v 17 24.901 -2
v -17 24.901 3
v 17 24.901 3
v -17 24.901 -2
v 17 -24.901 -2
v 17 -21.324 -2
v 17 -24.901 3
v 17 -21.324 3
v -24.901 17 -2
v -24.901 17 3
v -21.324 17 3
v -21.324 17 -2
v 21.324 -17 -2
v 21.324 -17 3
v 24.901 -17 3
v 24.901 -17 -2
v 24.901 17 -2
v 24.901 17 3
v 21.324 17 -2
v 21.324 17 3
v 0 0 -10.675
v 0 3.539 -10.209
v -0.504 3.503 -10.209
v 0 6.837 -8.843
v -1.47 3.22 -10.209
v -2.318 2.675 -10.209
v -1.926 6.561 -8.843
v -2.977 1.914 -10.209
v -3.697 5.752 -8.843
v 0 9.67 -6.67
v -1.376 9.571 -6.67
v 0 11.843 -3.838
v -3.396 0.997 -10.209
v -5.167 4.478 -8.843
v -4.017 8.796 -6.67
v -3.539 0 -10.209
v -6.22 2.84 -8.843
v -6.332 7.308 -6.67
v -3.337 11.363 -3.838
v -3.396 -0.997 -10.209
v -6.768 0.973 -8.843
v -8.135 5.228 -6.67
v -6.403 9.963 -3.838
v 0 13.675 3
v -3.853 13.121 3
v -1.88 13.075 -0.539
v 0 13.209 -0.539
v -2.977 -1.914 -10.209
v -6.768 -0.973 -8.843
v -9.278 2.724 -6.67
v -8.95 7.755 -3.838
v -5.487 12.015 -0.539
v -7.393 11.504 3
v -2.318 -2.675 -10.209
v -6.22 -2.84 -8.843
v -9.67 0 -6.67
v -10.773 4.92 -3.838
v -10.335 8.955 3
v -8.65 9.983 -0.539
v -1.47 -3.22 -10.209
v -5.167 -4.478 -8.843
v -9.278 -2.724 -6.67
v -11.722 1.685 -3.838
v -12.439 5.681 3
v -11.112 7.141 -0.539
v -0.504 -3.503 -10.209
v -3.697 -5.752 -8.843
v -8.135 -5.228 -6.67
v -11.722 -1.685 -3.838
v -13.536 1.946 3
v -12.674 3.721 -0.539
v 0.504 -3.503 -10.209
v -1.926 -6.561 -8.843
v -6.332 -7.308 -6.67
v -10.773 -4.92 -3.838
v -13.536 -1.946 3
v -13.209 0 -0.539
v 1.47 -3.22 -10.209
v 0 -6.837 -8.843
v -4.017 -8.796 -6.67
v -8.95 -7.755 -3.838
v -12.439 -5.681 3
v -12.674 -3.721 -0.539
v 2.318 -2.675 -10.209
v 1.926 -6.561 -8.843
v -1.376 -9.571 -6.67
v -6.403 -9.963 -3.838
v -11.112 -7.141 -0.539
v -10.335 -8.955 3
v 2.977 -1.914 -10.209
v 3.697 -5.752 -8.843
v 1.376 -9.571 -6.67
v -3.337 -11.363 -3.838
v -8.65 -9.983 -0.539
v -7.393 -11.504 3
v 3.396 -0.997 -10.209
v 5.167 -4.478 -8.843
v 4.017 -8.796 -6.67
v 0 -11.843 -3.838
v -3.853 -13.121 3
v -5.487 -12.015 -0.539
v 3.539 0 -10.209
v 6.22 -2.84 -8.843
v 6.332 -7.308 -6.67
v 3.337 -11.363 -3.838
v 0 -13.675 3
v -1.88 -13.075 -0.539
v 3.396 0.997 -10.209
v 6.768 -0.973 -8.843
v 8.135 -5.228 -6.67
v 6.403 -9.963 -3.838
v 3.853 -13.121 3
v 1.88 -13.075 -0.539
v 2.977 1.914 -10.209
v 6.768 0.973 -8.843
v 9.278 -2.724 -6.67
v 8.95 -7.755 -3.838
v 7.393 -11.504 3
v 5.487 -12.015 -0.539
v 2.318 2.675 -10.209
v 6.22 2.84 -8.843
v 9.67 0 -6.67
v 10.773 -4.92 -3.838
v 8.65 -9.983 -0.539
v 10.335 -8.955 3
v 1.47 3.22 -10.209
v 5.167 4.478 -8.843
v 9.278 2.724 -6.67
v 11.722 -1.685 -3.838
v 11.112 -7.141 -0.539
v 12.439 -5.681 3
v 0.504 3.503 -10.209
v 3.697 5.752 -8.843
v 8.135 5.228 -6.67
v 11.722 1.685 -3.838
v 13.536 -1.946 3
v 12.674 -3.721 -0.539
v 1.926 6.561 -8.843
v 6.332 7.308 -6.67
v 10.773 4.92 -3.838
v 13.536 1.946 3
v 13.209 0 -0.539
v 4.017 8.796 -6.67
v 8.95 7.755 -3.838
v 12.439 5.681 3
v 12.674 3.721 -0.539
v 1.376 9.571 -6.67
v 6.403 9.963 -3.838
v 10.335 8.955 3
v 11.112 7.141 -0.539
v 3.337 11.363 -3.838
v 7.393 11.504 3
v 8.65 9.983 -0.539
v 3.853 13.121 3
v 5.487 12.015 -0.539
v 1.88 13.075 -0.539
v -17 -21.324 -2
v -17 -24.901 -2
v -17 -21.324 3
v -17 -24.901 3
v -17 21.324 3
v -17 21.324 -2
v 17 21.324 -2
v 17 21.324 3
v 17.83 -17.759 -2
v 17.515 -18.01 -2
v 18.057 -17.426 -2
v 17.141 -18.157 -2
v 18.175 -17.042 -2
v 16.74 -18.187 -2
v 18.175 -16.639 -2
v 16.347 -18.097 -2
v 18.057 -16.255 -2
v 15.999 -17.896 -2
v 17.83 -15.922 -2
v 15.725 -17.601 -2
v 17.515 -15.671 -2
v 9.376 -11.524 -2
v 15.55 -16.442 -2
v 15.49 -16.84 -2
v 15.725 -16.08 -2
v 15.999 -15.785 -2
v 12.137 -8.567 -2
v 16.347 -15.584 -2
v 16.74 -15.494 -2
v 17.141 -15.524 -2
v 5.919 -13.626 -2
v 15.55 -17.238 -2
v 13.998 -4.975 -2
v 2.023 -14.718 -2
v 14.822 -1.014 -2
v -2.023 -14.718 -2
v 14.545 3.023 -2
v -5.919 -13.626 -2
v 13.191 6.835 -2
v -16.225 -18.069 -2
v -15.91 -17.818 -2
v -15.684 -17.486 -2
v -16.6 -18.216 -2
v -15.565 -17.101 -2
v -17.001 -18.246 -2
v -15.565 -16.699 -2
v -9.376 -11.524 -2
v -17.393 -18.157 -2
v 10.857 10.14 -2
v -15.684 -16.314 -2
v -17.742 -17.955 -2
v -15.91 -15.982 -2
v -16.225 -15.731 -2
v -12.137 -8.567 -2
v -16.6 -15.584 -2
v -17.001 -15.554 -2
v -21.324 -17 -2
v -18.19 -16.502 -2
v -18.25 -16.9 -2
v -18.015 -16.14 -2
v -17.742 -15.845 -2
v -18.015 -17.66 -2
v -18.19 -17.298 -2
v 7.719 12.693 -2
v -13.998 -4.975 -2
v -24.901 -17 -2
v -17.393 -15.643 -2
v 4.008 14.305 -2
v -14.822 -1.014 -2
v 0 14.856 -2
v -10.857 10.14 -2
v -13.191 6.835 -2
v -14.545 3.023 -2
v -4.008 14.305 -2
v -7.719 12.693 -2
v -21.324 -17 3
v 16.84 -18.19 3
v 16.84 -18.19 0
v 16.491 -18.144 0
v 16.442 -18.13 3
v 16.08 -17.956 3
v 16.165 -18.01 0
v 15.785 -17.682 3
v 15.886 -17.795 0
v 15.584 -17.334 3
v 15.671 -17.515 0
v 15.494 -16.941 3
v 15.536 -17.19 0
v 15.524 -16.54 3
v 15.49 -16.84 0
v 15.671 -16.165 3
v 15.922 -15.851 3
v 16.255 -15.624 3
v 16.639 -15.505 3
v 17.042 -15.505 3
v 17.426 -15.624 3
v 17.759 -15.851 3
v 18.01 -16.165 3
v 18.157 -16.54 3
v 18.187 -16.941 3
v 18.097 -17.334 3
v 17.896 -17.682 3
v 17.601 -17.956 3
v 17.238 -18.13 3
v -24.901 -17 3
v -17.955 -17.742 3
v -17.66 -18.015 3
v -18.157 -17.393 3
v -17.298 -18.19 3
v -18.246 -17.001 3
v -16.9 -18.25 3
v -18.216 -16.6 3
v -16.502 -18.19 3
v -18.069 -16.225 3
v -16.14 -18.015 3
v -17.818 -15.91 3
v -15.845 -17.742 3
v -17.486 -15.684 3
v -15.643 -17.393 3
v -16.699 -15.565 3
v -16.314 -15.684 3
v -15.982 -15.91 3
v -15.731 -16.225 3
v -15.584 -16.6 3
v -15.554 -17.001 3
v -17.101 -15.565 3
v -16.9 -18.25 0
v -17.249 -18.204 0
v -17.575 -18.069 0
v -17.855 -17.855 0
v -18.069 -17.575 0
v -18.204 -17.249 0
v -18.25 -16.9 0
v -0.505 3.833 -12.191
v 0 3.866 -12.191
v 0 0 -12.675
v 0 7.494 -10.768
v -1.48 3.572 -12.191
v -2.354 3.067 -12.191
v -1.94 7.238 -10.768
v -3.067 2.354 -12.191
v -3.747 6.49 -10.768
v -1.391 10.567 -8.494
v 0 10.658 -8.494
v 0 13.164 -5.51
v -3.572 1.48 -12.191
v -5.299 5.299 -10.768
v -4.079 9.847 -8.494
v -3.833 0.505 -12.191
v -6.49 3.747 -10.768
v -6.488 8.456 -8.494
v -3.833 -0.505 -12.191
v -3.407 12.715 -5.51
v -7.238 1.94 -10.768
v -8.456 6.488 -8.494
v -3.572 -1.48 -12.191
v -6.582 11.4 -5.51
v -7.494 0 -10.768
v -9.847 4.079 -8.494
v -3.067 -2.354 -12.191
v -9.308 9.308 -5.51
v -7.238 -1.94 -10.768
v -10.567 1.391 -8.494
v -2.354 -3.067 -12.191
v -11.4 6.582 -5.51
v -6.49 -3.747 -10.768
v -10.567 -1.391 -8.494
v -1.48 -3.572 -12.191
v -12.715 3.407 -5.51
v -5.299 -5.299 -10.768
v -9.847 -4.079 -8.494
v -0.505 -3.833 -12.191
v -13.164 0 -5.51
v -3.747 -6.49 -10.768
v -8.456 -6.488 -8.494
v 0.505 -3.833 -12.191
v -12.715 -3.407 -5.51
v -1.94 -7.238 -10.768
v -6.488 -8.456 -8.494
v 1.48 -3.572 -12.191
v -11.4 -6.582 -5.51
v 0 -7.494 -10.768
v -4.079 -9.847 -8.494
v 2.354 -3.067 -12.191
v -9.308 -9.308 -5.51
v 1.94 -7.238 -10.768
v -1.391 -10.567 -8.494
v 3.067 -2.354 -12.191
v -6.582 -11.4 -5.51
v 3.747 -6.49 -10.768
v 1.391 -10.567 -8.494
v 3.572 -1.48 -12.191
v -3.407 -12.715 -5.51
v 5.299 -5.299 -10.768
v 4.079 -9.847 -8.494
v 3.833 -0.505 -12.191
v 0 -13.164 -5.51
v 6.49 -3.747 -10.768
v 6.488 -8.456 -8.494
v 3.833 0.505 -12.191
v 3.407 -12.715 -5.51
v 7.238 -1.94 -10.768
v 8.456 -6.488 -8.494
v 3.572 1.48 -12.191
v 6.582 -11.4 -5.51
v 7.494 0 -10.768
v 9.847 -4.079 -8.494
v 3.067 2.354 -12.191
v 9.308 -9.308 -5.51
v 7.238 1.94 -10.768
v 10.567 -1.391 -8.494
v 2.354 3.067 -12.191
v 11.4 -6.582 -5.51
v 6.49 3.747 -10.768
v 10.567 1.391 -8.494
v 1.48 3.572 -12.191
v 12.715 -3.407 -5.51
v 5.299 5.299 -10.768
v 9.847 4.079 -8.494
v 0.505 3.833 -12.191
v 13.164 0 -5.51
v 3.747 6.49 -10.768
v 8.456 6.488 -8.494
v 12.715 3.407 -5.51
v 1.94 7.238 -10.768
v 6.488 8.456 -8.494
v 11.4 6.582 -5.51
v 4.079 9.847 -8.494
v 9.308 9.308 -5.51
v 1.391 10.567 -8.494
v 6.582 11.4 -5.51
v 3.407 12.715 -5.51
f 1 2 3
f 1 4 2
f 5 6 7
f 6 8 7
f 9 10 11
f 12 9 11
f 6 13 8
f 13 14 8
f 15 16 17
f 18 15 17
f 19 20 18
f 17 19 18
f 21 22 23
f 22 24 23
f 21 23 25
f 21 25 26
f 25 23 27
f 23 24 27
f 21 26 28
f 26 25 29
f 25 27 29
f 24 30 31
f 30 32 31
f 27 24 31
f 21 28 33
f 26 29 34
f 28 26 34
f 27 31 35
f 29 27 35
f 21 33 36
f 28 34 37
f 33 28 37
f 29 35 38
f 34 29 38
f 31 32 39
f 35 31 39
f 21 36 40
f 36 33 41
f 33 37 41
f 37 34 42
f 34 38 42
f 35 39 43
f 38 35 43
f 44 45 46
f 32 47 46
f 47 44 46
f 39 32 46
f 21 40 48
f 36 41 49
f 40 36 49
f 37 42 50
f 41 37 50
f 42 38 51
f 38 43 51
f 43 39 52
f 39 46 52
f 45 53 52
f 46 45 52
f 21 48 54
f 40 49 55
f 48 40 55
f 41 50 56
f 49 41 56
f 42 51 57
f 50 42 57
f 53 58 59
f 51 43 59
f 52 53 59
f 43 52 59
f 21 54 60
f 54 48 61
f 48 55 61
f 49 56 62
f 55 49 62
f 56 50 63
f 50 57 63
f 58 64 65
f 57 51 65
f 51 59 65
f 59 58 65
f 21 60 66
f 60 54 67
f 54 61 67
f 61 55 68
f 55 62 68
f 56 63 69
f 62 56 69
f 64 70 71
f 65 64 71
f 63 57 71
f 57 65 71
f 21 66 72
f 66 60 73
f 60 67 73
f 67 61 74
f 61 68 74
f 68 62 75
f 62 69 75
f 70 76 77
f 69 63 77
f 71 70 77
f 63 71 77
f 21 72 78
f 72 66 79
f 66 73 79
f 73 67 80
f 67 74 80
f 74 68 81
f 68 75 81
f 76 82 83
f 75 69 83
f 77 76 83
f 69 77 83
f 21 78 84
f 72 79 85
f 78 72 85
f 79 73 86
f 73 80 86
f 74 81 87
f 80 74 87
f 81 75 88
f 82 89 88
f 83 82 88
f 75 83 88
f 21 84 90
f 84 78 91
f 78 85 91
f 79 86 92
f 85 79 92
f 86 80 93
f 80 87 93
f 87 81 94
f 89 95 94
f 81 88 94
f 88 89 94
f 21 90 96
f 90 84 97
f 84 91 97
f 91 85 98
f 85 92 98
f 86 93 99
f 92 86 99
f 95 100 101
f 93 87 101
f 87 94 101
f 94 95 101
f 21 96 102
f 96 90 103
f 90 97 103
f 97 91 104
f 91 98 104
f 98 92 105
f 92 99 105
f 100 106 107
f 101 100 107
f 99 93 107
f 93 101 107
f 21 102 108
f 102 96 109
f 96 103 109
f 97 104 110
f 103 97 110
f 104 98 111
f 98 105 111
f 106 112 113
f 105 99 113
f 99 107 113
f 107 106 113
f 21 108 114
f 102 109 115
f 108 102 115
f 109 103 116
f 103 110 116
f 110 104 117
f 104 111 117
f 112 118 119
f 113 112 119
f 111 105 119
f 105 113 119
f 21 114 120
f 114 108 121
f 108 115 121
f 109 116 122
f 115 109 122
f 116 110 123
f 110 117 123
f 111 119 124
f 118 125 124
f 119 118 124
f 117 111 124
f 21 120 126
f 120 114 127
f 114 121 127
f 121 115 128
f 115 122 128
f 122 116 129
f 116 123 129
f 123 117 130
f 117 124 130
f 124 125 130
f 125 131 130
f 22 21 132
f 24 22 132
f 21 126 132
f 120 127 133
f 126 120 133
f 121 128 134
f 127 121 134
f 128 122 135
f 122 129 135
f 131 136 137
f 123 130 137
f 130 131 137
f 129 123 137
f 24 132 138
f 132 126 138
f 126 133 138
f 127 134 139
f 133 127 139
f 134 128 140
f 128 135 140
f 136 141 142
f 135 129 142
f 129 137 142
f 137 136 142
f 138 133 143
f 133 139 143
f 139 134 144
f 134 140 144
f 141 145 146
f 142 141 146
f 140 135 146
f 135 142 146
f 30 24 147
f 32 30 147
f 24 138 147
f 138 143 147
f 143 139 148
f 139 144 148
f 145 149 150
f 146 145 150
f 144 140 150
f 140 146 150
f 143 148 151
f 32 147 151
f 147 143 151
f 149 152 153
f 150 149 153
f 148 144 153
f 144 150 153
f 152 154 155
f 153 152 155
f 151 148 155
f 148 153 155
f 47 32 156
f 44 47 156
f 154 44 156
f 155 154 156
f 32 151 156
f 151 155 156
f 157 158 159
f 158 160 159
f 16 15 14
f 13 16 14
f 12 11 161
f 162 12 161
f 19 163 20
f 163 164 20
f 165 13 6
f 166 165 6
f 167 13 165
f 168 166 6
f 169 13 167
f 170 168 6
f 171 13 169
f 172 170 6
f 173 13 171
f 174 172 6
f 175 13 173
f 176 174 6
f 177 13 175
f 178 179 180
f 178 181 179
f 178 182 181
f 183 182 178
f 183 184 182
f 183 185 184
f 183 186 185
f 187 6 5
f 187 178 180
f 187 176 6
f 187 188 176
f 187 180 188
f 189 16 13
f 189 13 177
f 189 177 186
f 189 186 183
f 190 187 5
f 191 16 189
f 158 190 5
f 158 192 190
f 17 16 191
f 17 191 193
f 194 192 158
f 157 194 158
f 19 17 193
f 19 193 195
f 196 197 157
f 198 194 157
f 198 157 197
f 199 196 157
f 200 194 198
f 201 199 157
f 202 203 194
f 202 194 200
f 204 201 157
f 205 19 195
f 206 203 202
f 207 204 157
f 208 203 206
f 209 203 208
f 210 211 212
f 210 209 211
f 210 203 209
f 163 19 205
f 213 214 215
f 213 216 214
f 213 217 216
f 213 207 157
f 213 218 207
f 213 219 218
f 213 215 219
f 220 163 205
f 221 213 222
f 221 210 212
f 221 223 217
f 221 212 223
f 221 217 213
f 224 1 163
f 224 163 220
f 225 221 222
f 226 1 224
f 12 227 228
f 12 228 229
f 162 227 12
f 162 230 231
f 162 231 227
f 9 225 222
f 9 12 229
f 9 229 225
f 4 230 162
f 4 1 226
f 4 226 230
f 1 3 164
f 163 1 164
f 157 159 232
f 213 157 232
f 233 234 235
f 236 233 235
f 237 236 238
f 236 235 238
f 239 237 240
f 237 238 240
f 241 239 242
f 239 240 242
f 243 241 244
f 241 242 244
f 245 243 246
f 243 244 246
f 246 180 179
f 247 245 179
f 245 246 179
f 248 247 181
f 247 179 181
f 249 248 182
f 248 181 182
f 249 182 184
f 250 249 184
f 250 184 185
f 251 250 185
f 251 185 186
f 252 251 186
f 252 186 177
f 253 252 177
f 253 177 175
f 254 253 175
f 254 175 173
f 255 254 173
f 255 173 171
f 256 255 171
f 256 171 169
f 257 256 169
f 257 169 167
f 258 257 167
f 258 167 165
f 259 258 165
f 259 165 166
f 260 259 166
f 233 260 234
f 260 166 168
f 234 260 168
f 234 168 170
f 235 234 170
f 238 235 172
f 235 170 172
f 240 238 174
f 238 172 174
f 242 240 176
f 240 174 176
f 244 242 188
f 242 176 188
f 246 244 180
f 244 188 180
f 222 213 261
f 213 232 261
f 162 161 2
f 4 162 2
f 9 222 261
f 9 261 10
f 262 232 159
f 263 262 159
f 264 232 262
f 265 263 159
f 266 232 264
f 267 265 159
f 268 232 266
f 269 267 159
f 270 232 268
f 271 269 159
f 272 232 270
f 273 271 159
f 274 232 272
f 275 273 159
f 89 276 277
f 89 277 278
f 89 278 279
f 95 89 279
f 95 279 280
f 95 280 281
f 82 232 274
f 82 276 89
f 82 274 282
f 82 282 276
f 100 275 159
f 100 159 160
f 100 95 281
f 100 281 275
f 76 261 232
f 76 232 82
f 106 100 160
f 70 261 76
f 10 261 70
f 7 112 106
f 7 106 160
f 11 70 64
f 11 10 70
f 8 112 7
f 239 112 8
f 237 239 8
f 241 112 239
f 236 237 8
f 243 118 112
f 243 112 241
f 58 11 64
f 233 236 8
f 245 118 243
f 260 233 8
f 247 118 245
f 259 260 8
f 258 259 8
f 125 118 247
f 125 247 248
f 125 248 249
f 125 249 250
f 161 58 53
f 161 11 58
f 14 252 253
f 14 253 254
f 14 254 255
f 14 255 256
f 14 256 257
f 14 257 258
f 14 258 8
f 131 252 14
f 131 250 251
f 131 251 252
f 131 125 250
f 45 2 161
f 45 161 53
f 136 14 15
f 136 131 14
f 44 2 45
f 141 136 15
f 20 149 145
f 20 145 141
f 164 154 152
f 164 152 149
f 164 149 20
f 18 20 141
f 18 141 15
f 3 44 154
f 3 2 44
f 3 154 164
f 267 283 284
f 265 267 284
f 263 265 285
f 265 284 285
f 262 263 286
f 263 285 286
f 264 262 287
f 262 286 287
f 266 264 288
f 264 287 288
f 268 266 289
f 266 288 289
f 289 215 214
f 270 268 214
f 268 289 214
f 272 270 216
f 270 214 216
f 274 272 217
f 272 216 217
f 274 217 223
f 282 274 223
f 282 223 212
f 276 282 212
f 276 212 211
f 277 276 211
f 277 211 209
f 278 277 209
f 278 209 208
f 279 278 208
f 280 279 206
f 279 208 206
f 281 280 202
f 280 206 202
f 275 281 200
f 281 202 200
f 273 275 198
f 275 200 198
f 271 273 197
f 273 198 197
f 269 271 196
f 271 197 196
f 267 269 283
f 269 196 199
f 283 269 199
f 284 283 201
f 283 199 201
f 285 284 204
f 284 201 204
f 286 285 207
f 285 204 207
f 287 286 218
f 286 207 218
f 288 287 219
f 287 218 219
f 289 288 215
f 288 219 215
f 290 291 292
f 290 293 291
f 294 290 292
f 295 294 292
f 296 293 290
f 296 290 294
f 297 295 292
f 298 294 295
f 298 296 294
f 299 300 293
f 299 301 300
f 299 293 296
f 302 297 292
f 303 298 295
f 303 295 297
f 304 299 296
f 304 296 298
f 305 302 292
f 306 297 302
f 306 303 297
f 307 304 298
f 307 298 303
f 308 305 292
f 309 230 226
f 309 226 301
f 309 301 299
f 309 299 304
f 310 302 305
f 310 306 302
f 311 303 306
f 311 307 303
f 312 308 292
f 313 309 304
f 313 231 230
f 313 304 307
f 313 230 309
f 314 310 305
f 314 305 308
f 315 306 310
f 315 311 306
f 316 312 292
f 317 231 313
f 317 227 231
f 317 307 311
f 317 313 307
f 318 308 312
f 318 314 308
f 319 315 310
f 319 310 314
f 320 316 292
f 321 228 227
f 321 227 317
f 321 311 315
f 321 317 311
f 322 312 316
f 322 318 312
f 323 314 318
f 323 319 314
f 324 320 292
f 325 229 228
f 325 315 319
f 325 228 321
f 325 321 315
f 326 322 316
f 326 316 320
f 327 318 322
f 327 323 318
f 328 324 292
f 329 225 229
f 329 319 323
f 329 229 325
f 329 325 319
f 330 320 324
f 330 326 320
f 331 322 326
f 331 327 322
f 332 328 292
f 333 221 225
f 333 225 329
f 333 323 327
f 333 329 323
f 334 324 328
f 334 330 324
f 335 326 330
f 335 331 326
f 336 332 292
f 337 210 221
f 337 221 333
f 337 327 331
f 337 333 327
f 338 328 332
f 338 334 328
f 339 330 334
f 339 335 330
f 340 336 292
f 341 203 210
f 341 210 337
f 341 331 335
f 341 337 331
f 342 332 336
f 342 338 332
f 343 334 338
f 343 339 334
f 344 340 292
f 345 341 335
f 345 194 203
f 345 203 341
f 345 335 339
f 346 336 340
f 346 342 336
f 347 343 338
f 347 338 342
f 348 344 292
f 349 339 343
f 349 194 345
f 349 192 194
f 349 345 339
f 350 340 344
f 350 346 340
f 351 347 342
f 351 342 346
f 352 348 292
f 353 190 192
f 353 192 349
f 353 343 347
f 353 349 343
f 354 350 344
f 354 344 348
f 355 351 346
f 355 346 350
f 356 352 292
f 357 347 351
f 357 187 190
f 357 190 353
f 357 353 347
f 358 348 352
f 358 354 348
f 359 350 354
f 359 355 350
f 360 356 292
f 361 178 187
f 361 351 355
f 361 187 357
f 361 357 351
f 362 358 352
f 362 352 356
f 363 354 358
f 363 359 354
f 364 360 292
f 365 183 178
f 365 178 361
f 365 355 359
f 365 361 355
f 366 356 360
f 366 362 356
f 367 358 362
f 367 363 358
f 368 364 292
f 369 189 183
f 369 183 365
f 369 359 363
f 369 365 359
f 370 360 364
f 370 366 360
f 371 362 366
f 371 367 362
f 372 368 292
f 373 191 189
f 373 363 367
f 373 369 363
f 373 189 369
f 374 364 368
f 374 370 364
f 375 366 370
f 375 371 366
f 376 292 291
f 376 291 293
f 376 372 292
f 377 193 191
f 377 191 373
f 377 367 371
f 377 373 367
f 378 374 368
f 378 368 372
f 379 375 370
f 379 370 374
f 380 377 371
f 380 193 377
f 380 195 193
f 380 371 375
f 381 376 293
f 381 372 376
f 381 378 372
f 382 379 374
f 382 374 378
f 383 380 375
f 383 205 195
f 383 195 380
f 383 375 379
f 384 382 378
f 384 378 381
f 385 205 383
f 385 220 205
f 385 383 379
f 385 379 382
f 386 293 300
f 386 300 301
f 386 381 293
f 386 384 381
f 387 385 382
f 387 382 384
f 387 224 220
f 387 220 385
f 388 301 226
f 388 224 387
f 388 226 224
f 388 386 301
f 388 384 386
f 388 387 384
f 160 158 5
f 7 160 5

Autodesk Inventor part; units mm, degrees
ref_plane "YZ Plane" through (0, 0, 0) normal (1, 0, 0) x (0, 1, 0)
ref_plane "XZ Plane" through (0, 0, 0) normal (0, 1, 0) x (-1, 0, 0)
ref_plane "XY Plane" through (0, 0, 0) normal (0, 0, 1) x (1, 0, 0)
sketch "Sketch1" plane through (0, 0, 0) normal (0, 0, 1) x (1, 0, 0)
  line L0 (-38.8739, 0) -> (58.9391, 0) construction
  line L1 (0, -36.2399) -> (0, 43.1348) construction
  line L2 (0, 0) -> (31.7956, 31.7956) construction
  line L3 (0, 0) -> (44.9658, 0) construction
  line L4 (0, 24.9006) -> (16.8, 24.9006)
  line L5 (16.8, 24.9006) -> (16.8, 21.2406)
  line L6 (16.8, 21.2406) -> (19.0203, 19.0203)
  line L7 (24.9006, 0) -> (24.9006, 16.8)
  line L8 (24.9006, 16.8) -> (21.2406, 16.8)
  line L9 (21.2406, 16.8) -> (19.0203, 19.0203)
  line L10 (0, 24.9006) -> (-16.8, 24.9006)
  line L11 (-16.8, 24.9006) -> (-16.8, 21.2406)
  line L12 (-16.8, 21.2406) -> (-19.0203, 19.0203)
  line L13 (-24.9006, 0) -> (-24.9006, 16.8)
  line L14 (-24.9006, 16.8) -> (-21.2406, 16.8)
  line L15 (-21.2406, 16.8) -> (-19.0203, 19.0203)
  line L16 (0, -24.9006) -> (16.8, -24.9006)
  line L17 (16.8, -24.9006) -> (16.8, -21.2406)
  line L18 (16.8, -21.2406) -> (19.0203, -19.0203)
  line L19 (24.9006, 0) -> (24.9006, -16.8)
  line L20 (24.9006, -16.8) -> (21.2406, -16.8)
  line L21 (21.2406, -16.8) -> (19.0203, -19.0203)
  line L22 (0, -24.9006) -> (-16.8, -24.9006)
  line L23 (-16.8, -24.9006) -> (-16.8, -21.2406)
  line L24 (-16.8, -21.2406) -> (-19.0203, -19.0203)
  line L25 (-24.9006, 0) -> (-24.9006, -16.8)
  line L26 (-24.9006, -16.8) -> (-21.2406, -16.8)
  line L27 (-21.2406, -16.8) -> (-19.0203, -19.0203)
  circle A0 centre (0, 0) radius 13.675
  dimension "d0" = 45
  dimension "d1" = 16.8
  dimension "d2" = 3.66
  dimension "d3" = 3.14
  dimension "d4" = 27.35
extrude "Extrusion1" add sketch "Sketch1" along normal blind 3
sketch "Sketch2" plane through (0, 0, 3) normal (0, 0, 1) x (1, 0, 0)
  circle A0 centre (0, 0) radius 13.675 construction
  line L0 (16.8, 24.9006) -> (-16.8, 24.9006) construction
  line L1 (-16.8, 24.9006) -> (-16.8, 21.2406) construction
  line L2 (-16.8, 21.2406) -> (-21.2406, 16.8) construction
  line L3 (-21.2406, 16.8) -> (-24.9006, 16.8) construction
  line L4 (-24.9006, 16.8) -> (-24.9006, -16.8) construction
  line L5 (-24.9006, -16.8) -> (-21.2406, -16.8) construction
  line L6 (-21.2406, -16.8) -> (-16.8, -21.2406) construction
  line L7 (-16.8, -21.2406) -> (-16.8, -24.9006) construction
  line L8 (-16.8, -24.9006) -> (16.8, -24.9006) construction
  line L9 (16.8, -24.9006) -> (16.8, -21.2406) construction
  line L10 (16.8, -21.2406) -> (21.2406, -16.8) construction
  line L11 (21.2406, -16.8) -> (24.9006, -16.8) construction
  line L12 (24.9006, -16.8) -> (24.9006, 16.8) construction
  line L13 (24.9006, 16.8) -> (21.2406, 16.8) construction
  line L14 (21.2406, 16.8) -> (16.8, 21.2406) construction
  line L15 (16.8, 21.2406) -> (16.8, 24.9006) construction
  line L16 (-34.8609, 0) -> (34.8609, 0) construction
  line L17 (0, -34.8609) -> (0, 34.8609) construction
  circle A1 centre (13, -13) radius 2.5
  circle A2 centre (-13, -13) radius 2.5
  dimension "d7" = 5
  dimension "d8" = 13
  dimension "d9" = 13
extrude "Extrusion2" [suppressed]
sketch "Sketch3" plane through (0, 0, 0) normal (1, 0, 0) x (0, 1, 0)
  line L0 (-13.675, 3) -> (13.675, 3) construction
  line L1 (24.9006, 3) -> (21.2406, 3) construction
  line L2 (21.2406, 3) -> (16.8, 3) construction
  line L3 (16.8, 3) -> (-16.8, 3) construction
  line L4 (-16.8, 3) -> (-21.2406, 3) construction
  line L5 (-21.2406, 3) -> (-24.9006, 3) construction
  line L6 (-24.9006, 3) -> (-21.2406, 3) construction
  line L7 (-21.2406, 3) -> (-16.8, 3) construction
  line L8 (-16.8, 3) -> (16.8, 3) construction
  line L9 (16.8, 3) -> (21.2406, 3) construction
  line L10 (21.2406, 3) -> (24.9006, 3) construction
  line L11 (24.9006, 0) -> (21.2406, 0) construction
  line L12 (24.9006, 0) -> (24.9006, 3) construction
  line L13 (21.2406, 3) -> (24.9006, 3) construction
  line L14 (21.2406, 0) -> (21.2406, 3) construction
  line L15 (21.2406, 0) -> (16.8, 0) construction
  line L16 (21.2406, 0) -> (21.2406, 3) construction
  line L17 (16.8, 3) -> (21.2406, 3) construction
  line L18 (16.8, 0) -> (16.8, 3) construction
  line L19 (16.8, 0) -> (-16.8, 0) construction
  line L20 (16.8, 0) -> (16.8, 3) construction
  line L21 (-16.8, 3) -> (16.8, 3) construction
  line L22 (-16.8, 0) -> (-16.8, 3) construction
  line L23 (-16.8, 0) -> (-21.2406, 0) construction
  line L24 (-16.8, 0) -> (-16.8, 3) construction
  line L25 (-21.2406, 3) -> (-16.8, 3) construction
  line L26 (-21.2406, 0) -> (-21.2406, 3) construction
  line L27 (-21.2406, 0) -> (-24.9006, 0) construction
  line L28 (-21.2406, 0) -> (-21.2406, 3) construction
  line L29 (-24.9006, 3) -> (-21.2406, 3) construction
  line L30 (-24.9006, 0) -> (-24.9006, 3) construction
  line L31 (-13.675, 3) -> (13.675, 3) construction
  line L32 (13.675, 0) -> (-13.675, 0) construction
  line L33 (16.8, 3) -> (-16.8, 3)
  arc A0 (0, -10.675) -> (13.675, 3) centre (0, 3) ccw
  line L34 (0, -20.1765) -> (0, 6.8627) construction
  arc A1 (0, -12.675) -> (15.675, 3) centre (0, 3) ccw
  line L35 (0, -10.675) -> (0, -12.675)
  line L36 (15.675, 3) -> (13.675, 3)
revolve "Revolution1" add sketch "Sketch3" angle 360 about axis through (0, 0, -10) along (0, 0, 1)
sketch "Skizze4" plane through (0, 0, 3) normal (0, 0, 1) x (1, 0, 0)
  circle A0 centre (0, 0) radius 13.675 construction
  line L0 (16.8, 24.9006) -> (-16.8, 24.9006) construction
  line L1 (-16.8, 24.9006) -> (-16.8, 21.2406) projected
  line L2 (-16.8, 21.2406) -> (-21.2406, 16.8) projected
  line L3 (-21.2406, 16.8) -> (-24.9006, 16.8) projected
  line L4 (-24.9006, 16.8) -> (-24.9006, -16.8) construction
  line L5 (-24.9006, -16.8) -> (-21.2406, -16.8) projected
  line L6 (-21.2406, -16.8) -> (-16.8, -21.2406) projected
  line L7 (-16.8, -21.2406) -> (-16.8, -24.9006) projected
  line L8 (-16.8, -24.9006) -> (16.8, -24.9006) construction
  line L9 (16.8, -24.9006) -> (16.8, -21.2406) projected
  line L10 (16.8, -21.2406) -> (21.2406, -16.8) projected
  line L11 (21.2406, -16.8) -> (24.9006, -16.8) projected
  line L12 (24.9006, -16.8) -> (24.9006, 16.8) construction
  line L13 (24.9006, 16.8) -> (21.2406, 16.8) projected
  line L14 (21.2406, 16.8) -> (16.8, 21.2406) projected
  line L15 (16.8, 21.2406) -> (16.8, 24.9006) projected
  line L16 (-17, 25.1006) -> (17, 25.1006) construction
  line L17 (17, 25.1006) -> (17, 21.3235)
  line L18 (17, 21.3235) -> (21.3235, 17)
  line L19 (21.3235, 17) -> (25.1006, 17)
  line L20 (25.1006, 17) -> (25.1006, -17) construction
  line L21 (25.1006, -17) -> (21.3235, -17)
  line L22 (21.3235, -17) -> (17, -21.3235)
  line L23 (17, -21.3235) -> (17, -25.1006)
  line L24 (17, -25.1006) -> (-17, -25.1006) construction
  line L25 (-17, -25.1006) -> (-17, -21.3235)
  line L26 (-17, -21.3235) -> (-21.3235, -17)
  line L27 (-21.3235, -17) -> (-25.1006, -17)
  line L28 (-25.1006, -17) -> (-25.1006, 17) construction
  line L29 (-25.1006, 17) -> (-21.3235, 17)
  line L30 (-21.3235, 17) -> (-17, 21.3235)
  line L31 (-17, 21.3235) -> (-17, 25.1006)
  line L32 (-24.9006, 16.8) -> (-24.9006, 17)
  line L33 (16.8, 24.9006) -> (-16.8, 24.9006) projected
  line L34 (-16.8, 24.9006) -> (-17, 24.9006)
  line L35 (16.8, 24.9006) -> (17, 24.9006)
  line L36 (24.9006, -16.8) -> (24.9006, 16.8) projected
  line L37 (24.9006, 16.8) -> (24.9006, 17)
  line L38 (24.9006, -16.8) -> (24.9006, -17)
  line L39 (16.8, -24.9006) -> (16.8, -21.2406) projected
  line L40 (16.8, -24.9006) -> (17, -24.9006)
  line L41 (-16.8, -24.9006) -> (-17, -24.9006)
  line L42 (-24.9006, -16.8) -> (-24.9006, 16.8) projected
  line L43 (-24.9006, -16.8) -> (-24.9006, -17)
  dimension "d15" = 0.2
extrude "IM_offset" add sketch "Skizze4" against normal up to surface (3 mm away)
sketch "Sketch6" plane through (0, 0, 3) normal (0, 0, 1) x (1, 0, 0)
  circle A0 centre (-16.9, -16.9) radius 1.35 projected
  circle A1 centre (16.8404, -16.8404) radius 1.35 projected
  point P0 (0, 0)
hole "Hole1" at (-16.9, -16.9, 3) at (16.8404, -16.8404, 3) direction (0, 0, -1) diameter 2.7 end through all
sketch "Sketch7" plane through (0, 0, 0) normal (0, 0, -1) x (-1, 0, 0)
  circle A0 centre (16.9, -16.9) radius 1.35 projected
  circle A1 centre (-16.8404, -16.8404) radius 1.35 projected
  circle A2 centre (0, 0) radius 15.3852 projected
  line L0 (17, 24.9006) -> (-17, 24.9006) projected
  line L1 (-17, 24.9006) -> (-17, 21.3235) projected
  line L2 (-17, 21.3235) -> (-21.3235, 17) projected
  line L3 (-21.3235, 17) -> (-24.9006, 17) projected
  line L4 (-24.9006, 17) -> (-24.9006, -17) projected
  line L5 (-24.9006, -17) -> (-21.3235, -17) projected
  line L6 (-21.3235, -17) -> (-17, -21.3235) projected
  line L7 (-17, -21.3235) -> (-17, -24.9006) projected
  line L8 (-17, -24.9006) -> (17, -24.9006) projected
  line L9 (17, -24.9006) -> (17, -21.3235) projected
  line L10 (17, -21.3235) -> (21.3235, -17) projected
  line L11 (21.3235, -17) -> (24.9006, -17) projected
  line L12 (24.9006, -17) -> (24.9006, 17) projected
  line L13 (24.9006, 17) -> (21.3235, 17) projected
  line L14 (21.3235, 17) -> (17, 21.3235) projected
  line L15 (17, 21.3235) -> (17, 24.9006) projected
  circle A3 centre (0, 0) radius 13.675 projected
extrude "Extrusion4" add sketch "Sketch7" along normal blind 2 contours A2 | L15 L14 L13 L12 L11 L10 L9 L8 L7 L6 L5 L4 L3 L2 L1 L0
equation "\"d9\" = d8"
properties part number "20_Cube_Insert_Eye_v3"
